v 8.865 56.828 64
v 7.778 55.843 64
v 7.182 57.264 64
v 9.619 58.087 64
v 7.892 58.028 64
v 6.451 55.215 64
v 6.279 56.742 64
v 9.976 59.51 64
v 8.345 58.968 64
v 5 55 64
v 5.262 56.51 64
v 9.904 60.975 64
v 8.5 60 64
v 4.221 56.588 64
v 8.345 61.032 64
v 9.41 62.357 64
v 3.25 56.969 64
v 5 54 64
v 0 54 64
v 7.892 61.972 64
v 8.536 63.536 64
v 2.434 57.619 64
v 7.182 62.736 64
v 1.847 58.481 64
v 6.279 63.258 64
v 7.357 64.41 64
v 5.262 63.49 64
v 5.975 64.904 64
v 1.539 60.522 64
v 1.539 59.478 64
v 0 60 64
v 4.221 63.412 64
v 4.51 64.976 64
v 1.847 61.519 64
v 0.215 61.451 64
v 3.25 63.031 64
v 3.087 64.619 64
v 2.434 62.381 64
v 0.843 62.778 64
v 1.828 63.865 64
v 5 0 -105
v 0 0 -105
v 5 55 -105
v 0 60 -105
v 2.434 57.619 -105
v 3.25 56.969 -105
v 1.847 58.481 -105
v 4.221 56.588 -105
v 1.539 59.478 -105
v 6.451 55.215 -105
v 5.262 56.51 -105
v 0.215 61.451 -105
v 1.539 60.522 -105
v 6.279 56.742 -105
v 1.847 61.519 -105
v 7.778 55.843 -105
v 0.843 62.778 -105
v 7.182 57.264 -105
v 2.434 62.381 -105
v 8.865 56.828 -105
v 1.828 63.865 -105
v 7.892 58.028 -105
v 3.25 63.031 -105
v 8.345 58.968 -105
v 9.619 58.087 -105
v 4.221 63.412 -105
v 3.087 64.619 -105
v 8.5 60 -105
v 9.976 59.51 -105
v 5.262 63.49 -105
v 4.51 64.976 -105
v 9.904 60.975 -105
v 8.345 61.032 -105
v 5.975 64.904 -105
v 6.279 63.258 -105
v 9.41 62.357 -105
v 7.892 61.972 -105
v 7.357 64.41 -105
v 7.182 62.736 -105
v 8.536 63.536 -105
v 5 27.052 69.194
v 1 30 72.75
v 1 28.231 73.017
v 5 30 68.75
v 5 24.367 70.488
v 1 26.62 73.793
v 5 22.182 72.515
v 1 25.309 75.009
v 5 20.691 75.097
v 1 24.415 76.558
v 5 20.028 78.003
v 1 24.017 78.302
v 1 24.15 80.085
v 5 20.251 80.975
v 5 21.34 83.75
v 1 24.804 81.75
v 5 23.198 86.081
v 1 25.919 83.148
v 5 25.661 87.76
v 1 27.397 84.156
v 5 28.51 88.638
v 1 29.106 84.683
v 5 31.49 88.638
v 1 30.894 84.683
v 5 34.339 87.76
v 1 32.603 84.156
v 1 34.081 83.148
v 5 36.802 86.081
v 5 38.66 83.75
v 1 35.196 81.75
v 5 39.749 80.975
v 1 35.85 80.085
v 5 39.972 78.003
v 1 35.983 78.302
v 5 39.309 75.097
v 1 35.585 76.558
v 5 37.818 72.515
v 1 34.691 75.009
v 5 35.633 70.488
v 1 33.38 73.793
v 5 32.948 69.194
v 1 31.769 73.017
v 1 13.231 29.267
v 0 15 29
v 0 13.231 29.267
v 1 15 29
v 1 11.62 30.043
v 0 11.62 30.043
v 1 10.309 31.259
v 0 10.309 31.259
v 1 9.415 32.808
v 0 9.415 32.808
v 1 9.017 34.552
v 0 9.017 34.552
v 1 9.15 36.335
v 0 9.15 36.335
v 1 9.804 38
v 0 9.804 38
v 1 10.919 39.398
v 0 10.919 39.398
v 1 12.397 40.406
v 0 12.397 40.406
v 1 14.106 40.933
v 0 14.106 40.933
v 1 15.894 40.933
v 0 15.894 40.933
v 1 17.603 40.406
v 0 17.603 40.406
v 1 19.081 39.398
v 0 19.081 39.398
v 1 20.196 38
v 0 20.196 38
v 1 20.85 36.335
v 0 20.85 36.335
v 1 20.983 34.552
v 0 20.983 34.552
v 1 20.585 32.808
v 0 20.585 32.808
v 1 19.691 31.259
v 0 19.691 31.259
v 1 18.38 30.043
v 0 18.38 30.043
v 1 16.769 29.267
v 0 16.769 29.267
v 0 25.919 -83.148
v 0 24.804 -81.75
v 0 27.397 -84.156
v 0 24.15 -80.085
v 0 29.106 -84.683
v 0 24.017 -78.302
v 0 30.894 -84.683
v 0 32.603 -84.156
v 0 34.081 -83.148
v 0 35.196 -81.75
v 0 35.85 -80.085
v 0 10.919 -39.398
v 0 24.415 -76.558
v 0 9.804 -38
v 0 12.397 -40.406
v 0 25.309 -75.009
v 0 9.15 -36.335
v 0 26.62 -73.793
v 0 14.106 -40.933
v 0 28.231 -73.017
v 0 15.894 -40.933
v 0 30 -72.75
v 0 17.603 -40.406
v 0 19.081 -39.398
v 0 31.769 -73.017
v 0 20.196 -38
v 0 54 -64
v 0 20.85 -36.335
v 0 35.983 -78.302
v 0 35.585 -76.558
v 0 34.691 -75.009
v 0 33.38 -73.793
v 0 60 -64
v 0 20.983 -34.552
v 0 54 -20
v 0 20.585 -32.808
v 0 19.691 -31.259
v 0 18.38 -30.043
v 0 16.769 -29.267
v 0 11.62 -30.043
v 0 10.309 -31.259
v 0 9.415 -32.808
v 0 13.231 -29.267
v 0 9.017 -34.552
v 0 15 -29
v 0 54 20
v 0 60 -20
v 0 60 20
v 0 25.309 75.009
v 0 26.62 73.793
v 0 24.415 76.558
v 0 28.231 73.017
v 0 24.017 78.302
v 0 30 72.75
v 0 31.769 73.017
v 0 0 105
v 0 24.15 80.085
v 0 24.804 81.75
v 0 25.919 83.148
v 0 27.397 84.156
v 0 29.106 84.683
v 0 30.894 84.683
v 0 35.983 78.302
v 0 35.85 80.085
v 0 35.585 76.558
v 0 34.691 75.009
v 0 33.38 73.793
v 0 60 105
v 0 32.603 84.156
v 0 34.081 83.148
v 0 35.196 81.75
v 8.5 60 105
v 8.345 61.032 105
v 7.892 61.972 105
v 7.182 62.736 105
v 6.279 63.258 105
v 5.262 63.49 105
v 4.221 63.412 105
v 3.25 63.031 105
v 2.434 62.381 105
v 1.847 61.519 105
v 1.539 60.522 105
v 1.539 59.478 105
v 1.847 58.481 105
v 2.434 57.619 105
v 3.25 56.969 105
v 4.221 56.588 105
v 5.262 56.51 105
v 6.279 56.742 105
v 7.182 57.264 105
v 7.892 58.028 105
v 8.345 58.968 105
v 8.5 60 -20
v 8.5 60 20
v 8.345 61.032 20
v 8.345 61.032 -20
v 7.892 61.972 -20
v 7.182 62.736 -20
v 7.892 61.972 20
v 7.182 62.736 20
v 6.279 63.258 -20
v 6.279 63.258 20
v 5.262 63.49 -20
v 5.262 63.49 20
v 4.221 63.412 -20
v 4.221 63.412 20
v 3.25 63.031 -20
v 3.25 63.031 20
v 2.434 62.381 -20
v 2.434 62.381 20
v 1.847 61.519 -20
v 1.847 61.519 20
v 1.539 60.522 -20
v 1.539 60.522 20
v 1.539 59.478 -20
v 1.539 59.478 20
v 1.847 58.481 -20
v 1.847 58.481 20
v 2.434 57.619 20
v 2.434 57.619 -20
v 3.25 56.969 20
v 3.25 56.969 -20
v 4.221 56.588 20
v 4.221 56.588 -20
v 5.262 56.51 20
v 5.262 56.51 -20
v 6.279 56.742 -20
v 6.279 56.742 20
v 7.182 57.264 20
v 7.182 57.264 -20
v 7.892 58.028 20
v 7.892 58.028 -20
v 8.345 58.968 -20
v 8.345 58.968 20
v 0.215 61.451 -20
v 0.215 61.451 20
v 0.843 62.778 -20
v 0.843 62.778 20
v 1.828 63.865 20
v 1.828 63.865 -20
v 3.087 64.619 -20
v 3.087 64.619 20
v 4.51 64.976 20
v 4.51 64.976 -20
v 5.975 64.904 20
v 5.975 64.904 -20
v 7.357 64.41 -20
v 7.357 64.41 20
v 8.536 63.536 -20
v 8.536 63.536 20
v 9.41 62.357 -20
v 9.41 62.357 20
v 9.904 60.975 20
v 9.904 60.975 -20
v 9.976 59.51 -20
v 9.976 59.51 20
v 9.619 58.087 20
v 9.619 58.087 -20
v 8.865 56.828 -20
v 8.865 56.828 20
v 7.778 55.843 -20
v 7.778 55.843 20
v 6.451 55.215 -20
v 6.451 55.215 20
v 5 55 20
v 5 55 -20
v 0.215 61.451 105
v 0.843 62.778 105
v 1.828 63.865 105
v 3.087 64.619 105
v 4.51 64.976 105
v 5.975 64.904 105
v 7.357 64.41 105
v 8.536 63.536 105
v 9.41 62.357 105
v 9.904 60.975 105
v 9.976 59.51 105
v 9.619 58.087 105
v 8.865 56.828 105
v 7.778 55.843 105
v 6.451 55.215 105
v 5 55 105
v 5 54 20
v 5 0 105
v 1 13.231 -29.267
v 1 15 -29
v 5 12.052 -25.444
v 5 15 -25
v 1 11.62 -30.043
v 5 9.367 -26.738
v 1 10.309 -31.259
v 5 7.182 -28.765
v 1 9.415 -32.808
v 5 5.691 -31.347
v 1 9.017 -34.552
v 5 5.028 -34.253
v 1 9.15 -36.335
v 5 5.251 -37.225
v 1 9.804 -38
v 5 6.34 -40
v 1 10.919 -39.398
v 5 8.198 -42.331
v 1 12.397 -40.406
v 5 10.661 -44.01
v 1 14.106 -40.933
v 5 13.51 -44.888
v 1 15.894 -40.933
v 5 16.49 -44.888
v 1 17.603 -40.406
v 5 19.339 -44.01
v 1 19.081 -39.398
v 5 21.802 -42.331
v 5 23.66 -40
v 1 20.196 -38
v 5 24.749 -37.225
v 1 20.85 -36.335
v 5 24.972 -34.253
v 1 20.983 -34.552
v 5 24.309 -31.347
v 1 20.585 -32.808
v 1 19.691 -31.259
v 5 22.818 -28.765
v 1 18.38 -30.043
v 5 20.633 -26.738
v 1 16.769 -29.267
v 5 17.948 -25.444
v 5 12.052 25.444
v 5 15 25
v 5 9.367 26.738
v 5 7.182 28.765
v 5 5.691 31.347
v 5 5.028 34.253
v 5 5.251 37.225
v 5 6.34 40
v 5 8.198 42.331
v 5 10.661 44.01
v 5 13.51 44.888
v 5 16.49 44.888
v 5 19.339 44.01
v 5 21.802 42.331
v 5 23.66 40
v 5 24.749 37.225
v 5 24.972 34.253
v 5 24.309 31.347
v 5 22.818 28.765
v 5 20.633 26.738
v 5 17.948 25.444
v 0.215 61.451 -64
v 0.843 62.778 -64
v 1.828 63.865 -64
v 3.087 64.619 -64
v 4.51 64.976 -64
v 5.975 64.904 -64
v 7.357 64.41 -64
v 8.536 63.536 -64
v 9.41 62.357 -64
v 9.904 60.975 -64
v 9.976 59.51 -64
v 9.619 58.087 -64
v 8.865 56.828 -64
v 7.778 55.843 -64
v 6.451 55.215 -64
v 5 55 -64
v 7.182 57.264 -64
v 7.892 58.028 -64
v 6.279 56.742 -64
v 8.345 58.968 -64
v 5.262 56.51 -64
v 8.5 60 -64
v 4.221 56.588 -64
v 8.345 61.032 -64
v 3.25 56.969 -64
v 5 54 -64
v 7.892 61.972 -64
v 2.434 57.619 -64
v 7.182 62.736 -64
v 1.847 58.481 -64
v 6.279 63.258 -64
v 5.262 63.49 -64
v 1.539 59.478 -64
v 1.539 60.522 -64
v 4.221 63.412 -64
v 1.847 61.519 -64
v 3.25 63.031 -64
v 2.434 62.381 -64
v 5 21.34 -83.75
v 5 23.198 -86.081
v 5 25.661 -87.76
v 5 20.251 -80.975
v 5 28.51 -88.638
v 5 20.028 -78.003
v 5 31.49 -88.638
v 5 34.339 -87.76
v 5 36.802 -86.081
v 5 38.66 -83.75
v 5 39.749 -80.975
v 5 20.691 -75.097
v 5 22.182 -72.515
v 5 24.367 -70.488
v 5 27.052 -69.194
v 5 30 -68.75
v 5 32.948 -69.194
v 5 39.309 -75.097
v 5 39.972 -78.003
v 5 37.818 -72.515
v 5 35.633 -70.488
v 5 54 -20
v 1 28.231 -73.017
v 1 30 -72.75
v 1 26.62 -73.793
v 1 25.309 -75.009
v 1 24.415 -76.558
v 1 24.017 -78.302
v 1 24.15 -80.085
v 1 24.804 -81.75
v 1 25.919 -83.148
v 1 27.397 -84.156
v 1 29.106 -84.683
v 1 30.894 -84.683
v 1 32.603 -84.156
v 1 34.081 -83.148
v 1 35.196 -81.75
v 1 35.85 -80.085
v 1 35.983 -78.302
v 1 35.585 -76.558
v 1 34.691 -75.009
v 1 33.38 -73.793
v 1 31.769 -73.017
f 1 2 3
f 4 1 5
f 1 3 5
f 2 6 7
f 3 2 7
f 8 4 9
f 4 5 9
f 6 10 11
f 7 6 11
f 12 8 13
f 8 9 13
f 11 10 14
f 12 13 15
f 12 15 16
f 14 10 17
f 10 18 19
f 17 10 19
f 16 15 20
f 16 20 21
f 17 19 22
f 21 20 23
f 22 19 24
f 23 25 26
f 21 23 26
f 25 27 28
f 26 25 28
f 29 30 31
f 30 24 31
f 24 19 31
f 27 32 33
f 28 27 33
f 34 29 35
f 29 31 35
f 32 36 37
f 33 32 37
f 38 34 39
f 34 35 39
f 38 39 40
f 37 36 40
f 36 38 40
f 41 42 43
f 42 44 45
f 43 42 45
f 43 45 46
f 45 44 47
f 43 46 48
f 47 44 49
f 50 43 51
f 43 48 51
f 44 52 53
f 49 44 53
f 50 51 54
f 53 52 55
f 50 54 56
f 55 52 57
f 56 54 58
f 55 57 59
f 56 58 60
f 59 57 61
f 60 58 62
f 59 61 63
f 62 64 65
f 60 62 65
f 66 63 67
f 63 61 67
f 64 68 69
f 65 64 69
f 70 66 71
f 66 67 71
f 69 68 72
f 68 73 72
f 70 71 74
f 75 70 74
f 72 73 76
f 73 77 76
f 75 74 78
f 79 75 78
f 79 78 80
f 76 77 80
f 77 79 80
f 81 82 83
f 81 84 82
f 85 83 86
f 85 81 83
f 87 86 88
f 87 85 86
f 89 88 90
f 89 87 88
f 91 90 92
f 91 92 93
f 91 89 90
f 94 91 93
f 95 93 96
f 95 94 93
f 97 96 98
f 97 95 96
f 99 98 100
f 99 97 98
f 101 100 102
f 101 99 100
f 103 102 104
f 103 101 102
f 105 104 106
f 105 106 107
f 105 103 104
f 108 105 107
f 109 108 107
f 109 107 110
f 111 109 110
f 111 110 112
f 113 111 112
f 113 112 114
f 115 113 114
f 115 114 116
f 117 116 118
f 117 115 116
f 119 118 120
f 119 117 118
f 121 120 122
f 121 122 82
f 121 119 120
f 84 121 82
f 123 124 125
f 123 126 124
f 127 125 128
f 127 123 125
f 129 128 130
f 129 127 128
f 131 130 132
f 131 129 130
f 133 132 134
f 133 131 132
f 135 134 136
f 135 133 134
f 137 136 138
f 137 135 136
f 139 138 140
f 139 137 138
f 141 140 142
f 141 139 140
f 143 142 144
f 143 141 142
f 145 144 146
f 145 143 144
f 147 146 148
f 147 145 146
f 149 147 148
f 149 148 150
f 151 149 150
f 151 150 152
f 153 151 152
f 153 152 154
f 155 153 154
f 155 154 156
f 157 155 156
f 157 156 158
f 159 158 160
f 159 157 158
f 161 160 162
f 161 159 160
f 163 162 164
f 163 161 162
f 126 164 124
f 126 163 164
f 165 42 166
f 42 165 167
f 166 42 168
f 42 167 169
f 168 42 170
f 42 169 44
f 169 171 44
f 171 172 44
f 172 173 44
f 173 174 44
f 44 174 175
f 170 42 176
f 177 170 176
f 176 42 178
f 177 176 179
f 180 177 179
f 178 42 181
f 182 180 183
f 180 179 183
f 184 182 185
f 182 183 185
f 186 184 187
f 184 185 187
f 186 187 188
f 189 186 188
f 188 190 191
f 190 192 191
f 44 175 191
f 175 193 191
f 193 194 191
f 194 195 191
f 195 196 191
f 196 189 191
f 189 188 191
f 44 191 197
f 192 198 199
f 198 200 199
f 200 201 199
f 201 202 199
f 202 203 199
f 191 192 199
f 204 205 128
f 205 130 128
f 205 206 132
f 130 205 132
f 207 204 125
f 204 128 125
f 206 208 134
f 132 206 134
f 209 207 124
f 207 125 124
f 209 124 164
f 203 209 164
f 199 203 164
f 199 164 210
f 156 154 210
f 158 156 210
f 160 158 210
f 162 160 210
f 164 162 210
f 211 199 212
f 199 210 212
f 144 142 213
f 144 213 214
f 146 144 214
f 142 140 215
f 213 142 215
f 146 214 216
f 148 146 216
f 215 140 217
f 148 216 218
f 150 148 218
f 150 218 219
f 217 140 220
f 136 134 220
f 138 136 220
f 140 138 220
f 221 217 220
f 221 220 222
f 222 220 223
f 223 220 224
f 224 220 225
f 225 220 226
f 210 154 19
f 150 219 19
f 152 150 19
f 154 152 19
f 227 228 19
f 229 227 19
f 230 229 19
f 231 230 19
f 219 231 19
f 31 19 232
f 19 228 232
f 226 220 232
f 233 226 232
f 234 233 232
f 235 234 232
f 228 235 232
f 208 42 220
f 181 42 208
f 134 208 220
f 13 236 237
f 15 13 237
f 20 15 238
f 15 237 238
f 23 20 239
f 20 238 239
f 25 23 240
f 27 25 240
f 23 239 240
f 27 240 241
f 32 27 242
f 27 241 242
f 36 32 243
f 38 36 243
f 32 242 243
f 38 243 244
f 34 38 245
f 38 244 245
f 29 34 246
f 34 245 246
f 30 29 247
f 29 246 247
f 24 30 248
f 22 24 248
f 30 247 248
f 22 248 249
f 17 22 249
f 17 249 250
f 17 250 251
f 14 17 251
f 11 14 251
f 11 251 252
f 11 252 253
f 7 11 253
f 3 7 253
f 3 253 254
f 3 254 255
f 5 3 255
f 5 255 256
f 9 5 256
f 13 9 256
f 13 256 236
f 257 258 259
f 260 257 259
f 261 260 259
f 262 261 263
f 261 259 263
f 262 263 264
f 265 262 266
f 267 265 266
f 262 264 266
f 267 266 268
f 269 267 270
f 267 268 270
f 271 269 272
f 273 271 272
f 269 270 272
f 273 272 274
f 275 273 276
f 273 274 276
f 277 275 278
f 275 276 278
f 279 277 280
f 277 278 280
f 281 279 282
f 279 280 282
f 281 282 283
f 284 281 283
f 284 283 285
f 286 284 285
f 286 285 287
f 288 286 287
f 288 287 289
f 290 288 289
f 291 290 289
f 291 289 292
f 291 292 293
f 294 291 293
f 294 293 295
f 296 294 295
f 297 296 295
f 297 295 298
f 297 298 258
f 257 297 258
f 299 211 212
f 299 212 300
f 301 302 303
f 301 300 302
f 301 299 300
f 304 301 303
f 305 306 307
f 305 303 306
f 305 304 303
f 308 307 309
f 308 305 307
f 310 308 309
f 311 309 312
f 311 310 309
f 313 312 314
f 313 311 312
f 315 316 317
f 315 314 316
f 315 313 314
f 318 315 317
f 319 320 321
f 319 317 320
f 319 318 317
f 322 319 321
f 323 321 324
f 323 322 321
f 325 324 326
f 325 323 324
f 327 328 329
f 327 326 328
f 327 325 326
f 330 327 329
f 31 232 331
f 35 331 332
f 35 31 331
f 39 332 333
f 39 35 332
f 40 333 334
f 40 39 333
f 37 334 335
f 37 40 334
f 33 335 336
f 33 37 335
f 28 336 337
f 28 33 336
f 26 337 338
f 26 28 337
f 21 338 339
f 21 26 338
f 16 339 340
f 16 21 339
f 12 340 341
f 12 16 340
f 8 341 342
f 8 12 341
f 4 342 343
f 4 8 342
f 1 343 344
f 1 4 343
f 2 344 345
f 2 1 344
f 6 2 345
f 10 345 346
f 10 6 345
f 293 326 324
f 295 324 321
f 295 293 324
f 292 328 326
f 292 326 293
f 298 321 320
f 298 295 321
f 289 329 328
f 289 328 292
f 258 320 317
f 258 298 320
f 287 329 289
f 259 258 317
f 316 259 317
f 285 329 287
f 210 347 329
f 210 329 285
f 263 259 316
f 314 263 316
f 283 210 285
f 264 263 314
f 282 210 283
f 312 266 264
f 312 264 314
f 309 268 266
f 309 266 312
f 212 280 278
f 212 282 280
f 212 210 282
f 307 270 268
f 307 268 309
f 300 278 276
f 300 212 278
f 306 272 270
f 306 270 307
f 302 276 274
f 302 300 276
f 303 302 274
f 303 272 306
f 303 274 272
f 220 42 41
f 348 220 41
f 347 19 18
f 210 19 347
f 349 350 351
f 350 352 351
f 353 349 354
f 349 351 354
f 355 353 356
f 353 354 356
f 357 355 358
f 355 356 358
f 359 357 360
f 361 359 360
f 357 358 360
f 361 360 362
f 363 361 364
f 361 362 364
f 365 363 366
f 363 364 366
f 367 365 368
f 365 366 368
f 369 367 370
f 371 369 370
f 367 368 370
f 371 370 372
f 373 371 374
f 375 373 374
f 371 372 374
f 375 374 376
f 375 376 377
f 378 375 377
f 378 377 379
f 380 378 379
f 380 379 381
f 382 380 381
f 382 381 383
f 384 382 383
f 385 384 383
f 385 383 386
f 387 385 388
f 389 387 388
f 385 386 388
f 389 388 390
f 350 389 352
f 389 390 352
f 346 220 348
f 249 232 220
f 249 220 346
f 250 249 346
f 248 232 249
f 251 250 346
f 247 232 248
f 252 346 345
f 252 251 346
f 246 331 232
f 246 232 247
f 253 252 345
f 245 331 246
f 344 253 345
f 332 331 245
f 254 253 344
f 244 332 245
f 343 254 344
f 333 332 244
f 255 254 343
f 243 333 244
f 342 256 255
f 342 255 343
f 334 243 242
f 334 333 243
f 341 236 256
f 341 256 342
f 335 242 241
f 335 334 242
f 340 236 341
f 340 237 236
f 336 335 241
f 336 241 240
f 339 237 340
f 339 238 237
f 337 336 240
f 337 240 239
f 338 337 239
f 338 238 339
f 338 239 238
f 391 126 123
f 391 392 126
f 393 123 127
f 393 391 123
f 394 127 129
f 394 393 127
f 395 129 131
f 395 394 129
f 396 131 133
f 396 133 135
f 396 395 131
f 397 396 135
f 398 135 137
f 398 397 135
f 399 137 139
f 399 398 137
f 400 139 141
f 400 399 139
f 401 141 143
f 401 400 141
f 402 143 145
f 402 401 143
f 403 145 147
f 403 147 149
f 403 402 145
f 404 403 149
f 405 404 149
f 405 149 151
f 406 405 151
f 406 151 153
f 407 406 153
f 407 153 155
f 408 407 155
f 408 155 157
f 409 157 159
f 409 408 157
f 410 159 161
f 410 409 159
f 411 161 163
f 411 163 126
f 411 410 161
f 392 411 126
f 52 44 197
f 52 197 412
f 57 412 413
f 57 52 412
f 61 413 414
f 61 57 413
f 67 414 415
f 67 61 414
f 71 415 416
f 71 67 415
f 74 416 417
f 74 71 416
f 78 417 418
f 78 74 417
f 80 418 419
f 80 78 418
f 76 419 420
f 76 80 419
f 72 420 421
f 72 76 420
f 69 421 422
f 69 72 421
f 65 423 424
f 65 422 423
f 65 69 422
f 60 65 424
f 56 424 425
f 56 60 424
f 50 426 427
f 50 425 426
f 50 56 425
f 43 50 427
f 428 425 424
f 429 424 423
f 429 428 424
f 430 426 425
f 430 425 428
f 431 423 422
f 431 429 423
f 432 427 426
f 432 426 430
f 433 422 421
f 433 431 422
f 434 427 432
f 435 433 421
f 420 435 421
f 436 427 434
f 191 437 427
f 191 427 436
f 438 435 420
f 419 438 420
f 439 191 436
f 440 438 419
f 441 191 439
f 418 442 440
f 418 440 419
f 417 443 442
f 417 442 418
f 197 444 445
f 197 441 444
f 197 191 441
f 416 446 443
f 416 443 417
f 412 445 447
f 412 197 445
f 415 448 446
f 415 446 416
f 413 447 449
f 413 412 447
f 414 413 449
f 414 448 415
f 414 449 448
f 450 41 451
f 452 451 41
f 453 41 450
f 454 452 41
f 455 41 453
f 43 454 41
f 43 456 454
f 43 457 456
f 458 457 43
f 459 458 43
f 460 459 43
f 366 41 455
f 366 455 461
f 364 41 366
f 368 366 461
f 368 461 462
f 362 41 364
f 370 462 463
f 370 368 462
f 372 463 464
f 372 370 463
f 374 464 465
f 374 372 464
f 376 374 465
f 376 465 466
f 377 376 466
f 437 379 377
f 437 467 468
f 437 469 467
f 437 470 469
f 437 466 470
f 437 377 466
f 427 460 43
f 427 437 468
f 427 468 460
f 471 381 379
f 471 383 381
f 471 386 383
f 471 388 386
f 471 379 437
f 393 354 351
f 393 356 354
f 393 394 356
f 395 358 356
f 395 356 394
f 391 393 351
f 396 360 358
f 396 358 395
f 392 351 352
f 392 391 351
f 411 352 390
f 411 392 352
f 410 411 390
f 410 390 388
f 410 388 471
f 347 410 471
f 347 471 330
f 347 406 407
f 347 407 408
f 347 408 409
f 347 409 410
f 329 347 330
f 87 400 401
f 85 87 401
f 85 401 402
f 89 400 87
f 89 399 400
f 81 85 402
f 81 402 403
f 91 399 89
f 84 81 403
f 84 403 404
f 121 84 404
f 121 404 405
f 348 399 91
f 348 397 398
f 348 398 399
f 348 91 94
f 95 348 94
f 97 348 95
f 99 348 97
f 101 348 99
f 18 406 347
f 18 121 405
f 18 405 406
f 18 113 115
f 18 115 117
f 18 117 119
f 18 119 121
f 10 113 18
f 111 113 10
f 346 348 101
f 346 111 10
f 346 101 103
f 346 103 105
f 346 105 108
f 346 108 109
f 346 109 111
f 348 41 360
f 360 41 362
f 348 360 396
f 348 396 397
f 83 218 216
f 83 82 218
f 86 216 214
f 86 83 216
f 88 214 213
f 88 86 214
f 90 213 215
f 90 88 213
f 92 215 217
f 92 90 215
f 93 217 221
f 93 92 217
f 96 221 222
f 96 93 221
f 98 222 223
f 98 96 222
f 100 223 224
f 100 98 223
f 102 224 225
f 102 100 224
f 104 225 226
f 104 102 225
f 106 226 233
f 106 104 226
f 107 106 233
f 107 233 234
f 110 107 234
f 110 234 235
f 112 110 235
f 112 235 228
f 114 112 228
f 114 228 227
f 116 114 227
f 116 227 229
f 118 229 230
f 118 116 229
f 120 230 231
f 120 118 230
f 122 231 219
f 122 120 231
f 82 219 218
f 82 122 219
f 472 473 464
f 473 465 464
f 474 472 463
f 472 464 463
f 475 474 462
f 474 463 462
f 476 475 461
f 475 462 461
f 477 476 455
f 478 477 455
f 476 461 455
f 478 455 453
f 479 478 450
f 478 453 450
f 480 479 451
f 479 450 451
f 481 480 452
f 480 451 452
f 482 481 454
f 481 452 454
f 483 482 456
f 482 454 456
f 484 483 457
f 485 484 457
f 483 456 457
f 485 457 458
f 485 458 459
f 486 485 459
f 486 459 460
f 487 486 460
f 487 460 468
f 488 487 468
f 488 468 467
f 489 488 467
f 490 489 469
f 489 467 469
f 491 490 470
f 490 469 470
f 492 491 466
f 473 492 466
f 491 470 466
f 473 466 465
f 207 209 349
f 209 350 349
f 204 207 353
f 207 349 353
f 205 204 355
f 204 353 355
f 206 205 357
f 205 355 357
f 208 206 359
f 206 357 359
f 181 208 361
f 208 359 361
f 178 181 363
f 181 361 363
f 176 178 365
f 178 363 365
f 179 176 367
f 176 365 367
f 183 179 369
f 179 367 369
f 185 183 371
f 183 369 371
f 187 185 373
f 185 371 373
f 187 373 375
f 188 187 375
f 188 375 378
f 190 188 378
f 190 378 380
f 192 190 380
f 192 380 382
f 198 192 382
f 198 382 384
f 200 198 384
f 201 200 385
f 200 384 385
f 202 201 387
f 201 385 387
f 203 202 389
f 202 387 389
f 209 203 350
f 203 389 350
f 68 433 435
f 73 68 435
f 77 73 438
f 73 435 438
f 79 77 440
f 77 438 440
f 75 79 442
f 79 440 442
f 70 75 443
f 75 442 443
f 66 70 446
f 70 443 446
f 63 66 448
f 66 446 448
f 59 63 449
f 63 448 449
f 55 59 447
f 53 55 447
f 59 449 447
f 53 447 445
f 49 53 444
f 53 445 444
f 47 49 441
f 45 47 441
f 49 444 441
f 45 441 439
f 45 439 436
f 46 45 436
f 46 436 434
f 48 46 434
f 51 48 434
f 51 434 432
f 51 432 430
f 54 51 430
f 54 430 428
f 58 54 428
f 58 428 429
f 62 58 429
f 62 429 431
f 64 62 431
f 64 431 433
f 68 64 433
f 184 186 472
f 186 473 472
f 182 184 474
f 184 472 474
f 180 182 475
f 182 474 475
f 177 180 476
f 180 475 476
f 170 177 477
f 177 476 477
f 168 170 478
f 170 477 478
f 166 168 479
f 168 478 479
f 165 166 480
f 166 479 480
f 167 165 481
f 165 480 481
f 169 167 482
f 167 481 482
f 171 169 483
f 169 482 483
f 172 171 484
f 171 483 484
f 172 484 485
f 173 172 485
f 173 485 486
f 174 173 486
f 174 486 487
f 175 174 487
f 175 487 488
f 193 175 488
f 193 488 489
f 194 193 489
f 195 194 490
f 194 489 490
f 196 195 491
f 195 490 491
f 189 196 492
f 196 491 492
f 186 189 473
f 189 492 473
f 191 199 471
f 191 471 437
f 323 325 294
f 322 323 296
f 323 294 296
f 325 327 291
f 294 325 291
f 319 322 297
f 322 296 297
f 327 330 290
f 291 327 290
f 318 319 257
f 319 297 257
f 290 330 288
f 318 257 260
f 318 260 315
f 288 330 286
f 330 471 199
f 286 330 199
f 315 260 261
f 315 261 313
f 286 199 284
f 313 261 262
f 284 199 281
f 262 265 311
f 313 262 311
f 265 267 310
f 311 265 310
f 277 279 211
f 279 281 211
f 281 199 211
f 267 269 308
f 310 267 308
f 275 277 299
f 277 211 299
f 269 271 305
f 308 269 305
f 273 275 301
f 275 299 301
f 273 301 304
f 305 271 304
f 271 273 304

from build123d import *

# Parameters (mm, degrees)
SKETCH_1_W                  = 5
SKETCH_1_H                  = 60
EXTRUDE_2_DEPTH             = 105
SKETCH_2_R                  = 5
SKETCH_3_R                  = 3.5
CUT_EXTRUDE_1_DEPTH         = 221.056810847
HOLE_WIZARD_M101_AT_2_COUNT = 2
HOLE_WIZARD_M101_AT_2_PITCH = 46.25
VIR_2_DEPTH                 = 124.592070943
VIR_2_DEPTH_BACK            = 124.592070943
SKETCH_12_W                 = 44
SKETCH_12_H                 = 11


with BuildPart() as part:
    # Эскиз1 → Вытянуть-Тонкостенный2 (new, symmetric)
    with BuildSketch(Plane.XY):
        with Locations((2.5, 30)):
            Rectangle(SKETCH_1_W, SKETCH_1_H)
    extrude(amount=EXTRUDE_2_DEPTH, both=True)

    # По траектории1: sweep along a curve in space
    with BuildLine() as sweep_1_path:
        Line((0, 60, 105), (0, 60, -105))
    # Эскиз2 → По траектории1 (sweep)
    with BuildSketch(Plane.XY.offset(105)):
        with Locations((5, 60)):
            Circle(SKETCH_2_R)
    sweep(path=sweep_1_path.line)

    # Эскиз3 → Вырез-Вытянуть1 (cut, through all)
    with BuildSketch(Plane.XY.offset(105)):
        with Locations((5, 60)):
            Circle(SKETCH_3_R)
    extrude(amount=-CUT_EXTRUDE_1_DEPTH, mode=Mode.SUBTRACT)

    # Эскиз8 → Зенковка для  винта с плоской головкой M101 (revolve, cut)
    with BuildSketch(Plane(origin=(5, 30, 78.75), x_dir=(0, 0, -1), z_dir=(0, 1, 0))):
        Polygon((0, 0), (0, 5), (6, 5), (6, 4), (10, 0), align=None)
    hole_wizard_m101 = revolve(axis=Axis((11.35, 30, 78.75), (-1, 0, 0)), mode=Mode.SUBTRACT)

    # Зенковка для  винта с плоской головкой M101 at 2: Зенковка для  винта с плоской головкой M101 ×2
    with Locations(*[Vector(0, -0.3243243243243243, -0.945945945945946) * (i * HOLE_WIZARD_M101_AT_2_PITCH) for i in range(1, HOLE_WIZARD_M101_AT_2_COUNT)]):
        add(hole_wizard_m101, mode=Mode.SUBTRACT)

    # Зеркальное отражение1: Зенковка для  винта с плоской головкой M101 across plane
    add(hole_wizard_m101.mirror(Plane.XY), mode=Mode.SUBTRACT)

    # Зеркальное отражение1 copy 1 sketch → Зеркальное отражение1 copy 1 (revolve, cut)
    with BuildSketch(Plane(origin=(5, 15, -35), x_dir=(0, 0, 1), z_dir=(0, 1, 0))):
        Polygon((0, 0), (0, -5), (6, -5), (6, -4), (10, 0), align=None)
    revolve(axis=Axis((11.35, 15, -35), (1, 0, 0)), mode=Mode.SUBTRACT)

    # Эскиз12 → vir_2 (cut, two sides: drawn at the far end of the back side and taken through both)
    with BuildSketch(Plane(origin=(5, 0, 0), x_dir=(0, 0, -1), z_dir=(1, 0, 0)).offset(-VIR_2_DEPTH_BACK)):
        with Locations((-42, 59.5)):
            Rectangle(SKETCH_12_W, SKETCH_12_H)
        with Locations((42, 59.5)):
            Rectangle(SKETCH_12_W, SKETCH_12_H)
    extrude(amount=VIR_2_DEPTH + VIR_2_DEPTH_BACK, mode=Mode.SUBTRACT)


solid = part.part
